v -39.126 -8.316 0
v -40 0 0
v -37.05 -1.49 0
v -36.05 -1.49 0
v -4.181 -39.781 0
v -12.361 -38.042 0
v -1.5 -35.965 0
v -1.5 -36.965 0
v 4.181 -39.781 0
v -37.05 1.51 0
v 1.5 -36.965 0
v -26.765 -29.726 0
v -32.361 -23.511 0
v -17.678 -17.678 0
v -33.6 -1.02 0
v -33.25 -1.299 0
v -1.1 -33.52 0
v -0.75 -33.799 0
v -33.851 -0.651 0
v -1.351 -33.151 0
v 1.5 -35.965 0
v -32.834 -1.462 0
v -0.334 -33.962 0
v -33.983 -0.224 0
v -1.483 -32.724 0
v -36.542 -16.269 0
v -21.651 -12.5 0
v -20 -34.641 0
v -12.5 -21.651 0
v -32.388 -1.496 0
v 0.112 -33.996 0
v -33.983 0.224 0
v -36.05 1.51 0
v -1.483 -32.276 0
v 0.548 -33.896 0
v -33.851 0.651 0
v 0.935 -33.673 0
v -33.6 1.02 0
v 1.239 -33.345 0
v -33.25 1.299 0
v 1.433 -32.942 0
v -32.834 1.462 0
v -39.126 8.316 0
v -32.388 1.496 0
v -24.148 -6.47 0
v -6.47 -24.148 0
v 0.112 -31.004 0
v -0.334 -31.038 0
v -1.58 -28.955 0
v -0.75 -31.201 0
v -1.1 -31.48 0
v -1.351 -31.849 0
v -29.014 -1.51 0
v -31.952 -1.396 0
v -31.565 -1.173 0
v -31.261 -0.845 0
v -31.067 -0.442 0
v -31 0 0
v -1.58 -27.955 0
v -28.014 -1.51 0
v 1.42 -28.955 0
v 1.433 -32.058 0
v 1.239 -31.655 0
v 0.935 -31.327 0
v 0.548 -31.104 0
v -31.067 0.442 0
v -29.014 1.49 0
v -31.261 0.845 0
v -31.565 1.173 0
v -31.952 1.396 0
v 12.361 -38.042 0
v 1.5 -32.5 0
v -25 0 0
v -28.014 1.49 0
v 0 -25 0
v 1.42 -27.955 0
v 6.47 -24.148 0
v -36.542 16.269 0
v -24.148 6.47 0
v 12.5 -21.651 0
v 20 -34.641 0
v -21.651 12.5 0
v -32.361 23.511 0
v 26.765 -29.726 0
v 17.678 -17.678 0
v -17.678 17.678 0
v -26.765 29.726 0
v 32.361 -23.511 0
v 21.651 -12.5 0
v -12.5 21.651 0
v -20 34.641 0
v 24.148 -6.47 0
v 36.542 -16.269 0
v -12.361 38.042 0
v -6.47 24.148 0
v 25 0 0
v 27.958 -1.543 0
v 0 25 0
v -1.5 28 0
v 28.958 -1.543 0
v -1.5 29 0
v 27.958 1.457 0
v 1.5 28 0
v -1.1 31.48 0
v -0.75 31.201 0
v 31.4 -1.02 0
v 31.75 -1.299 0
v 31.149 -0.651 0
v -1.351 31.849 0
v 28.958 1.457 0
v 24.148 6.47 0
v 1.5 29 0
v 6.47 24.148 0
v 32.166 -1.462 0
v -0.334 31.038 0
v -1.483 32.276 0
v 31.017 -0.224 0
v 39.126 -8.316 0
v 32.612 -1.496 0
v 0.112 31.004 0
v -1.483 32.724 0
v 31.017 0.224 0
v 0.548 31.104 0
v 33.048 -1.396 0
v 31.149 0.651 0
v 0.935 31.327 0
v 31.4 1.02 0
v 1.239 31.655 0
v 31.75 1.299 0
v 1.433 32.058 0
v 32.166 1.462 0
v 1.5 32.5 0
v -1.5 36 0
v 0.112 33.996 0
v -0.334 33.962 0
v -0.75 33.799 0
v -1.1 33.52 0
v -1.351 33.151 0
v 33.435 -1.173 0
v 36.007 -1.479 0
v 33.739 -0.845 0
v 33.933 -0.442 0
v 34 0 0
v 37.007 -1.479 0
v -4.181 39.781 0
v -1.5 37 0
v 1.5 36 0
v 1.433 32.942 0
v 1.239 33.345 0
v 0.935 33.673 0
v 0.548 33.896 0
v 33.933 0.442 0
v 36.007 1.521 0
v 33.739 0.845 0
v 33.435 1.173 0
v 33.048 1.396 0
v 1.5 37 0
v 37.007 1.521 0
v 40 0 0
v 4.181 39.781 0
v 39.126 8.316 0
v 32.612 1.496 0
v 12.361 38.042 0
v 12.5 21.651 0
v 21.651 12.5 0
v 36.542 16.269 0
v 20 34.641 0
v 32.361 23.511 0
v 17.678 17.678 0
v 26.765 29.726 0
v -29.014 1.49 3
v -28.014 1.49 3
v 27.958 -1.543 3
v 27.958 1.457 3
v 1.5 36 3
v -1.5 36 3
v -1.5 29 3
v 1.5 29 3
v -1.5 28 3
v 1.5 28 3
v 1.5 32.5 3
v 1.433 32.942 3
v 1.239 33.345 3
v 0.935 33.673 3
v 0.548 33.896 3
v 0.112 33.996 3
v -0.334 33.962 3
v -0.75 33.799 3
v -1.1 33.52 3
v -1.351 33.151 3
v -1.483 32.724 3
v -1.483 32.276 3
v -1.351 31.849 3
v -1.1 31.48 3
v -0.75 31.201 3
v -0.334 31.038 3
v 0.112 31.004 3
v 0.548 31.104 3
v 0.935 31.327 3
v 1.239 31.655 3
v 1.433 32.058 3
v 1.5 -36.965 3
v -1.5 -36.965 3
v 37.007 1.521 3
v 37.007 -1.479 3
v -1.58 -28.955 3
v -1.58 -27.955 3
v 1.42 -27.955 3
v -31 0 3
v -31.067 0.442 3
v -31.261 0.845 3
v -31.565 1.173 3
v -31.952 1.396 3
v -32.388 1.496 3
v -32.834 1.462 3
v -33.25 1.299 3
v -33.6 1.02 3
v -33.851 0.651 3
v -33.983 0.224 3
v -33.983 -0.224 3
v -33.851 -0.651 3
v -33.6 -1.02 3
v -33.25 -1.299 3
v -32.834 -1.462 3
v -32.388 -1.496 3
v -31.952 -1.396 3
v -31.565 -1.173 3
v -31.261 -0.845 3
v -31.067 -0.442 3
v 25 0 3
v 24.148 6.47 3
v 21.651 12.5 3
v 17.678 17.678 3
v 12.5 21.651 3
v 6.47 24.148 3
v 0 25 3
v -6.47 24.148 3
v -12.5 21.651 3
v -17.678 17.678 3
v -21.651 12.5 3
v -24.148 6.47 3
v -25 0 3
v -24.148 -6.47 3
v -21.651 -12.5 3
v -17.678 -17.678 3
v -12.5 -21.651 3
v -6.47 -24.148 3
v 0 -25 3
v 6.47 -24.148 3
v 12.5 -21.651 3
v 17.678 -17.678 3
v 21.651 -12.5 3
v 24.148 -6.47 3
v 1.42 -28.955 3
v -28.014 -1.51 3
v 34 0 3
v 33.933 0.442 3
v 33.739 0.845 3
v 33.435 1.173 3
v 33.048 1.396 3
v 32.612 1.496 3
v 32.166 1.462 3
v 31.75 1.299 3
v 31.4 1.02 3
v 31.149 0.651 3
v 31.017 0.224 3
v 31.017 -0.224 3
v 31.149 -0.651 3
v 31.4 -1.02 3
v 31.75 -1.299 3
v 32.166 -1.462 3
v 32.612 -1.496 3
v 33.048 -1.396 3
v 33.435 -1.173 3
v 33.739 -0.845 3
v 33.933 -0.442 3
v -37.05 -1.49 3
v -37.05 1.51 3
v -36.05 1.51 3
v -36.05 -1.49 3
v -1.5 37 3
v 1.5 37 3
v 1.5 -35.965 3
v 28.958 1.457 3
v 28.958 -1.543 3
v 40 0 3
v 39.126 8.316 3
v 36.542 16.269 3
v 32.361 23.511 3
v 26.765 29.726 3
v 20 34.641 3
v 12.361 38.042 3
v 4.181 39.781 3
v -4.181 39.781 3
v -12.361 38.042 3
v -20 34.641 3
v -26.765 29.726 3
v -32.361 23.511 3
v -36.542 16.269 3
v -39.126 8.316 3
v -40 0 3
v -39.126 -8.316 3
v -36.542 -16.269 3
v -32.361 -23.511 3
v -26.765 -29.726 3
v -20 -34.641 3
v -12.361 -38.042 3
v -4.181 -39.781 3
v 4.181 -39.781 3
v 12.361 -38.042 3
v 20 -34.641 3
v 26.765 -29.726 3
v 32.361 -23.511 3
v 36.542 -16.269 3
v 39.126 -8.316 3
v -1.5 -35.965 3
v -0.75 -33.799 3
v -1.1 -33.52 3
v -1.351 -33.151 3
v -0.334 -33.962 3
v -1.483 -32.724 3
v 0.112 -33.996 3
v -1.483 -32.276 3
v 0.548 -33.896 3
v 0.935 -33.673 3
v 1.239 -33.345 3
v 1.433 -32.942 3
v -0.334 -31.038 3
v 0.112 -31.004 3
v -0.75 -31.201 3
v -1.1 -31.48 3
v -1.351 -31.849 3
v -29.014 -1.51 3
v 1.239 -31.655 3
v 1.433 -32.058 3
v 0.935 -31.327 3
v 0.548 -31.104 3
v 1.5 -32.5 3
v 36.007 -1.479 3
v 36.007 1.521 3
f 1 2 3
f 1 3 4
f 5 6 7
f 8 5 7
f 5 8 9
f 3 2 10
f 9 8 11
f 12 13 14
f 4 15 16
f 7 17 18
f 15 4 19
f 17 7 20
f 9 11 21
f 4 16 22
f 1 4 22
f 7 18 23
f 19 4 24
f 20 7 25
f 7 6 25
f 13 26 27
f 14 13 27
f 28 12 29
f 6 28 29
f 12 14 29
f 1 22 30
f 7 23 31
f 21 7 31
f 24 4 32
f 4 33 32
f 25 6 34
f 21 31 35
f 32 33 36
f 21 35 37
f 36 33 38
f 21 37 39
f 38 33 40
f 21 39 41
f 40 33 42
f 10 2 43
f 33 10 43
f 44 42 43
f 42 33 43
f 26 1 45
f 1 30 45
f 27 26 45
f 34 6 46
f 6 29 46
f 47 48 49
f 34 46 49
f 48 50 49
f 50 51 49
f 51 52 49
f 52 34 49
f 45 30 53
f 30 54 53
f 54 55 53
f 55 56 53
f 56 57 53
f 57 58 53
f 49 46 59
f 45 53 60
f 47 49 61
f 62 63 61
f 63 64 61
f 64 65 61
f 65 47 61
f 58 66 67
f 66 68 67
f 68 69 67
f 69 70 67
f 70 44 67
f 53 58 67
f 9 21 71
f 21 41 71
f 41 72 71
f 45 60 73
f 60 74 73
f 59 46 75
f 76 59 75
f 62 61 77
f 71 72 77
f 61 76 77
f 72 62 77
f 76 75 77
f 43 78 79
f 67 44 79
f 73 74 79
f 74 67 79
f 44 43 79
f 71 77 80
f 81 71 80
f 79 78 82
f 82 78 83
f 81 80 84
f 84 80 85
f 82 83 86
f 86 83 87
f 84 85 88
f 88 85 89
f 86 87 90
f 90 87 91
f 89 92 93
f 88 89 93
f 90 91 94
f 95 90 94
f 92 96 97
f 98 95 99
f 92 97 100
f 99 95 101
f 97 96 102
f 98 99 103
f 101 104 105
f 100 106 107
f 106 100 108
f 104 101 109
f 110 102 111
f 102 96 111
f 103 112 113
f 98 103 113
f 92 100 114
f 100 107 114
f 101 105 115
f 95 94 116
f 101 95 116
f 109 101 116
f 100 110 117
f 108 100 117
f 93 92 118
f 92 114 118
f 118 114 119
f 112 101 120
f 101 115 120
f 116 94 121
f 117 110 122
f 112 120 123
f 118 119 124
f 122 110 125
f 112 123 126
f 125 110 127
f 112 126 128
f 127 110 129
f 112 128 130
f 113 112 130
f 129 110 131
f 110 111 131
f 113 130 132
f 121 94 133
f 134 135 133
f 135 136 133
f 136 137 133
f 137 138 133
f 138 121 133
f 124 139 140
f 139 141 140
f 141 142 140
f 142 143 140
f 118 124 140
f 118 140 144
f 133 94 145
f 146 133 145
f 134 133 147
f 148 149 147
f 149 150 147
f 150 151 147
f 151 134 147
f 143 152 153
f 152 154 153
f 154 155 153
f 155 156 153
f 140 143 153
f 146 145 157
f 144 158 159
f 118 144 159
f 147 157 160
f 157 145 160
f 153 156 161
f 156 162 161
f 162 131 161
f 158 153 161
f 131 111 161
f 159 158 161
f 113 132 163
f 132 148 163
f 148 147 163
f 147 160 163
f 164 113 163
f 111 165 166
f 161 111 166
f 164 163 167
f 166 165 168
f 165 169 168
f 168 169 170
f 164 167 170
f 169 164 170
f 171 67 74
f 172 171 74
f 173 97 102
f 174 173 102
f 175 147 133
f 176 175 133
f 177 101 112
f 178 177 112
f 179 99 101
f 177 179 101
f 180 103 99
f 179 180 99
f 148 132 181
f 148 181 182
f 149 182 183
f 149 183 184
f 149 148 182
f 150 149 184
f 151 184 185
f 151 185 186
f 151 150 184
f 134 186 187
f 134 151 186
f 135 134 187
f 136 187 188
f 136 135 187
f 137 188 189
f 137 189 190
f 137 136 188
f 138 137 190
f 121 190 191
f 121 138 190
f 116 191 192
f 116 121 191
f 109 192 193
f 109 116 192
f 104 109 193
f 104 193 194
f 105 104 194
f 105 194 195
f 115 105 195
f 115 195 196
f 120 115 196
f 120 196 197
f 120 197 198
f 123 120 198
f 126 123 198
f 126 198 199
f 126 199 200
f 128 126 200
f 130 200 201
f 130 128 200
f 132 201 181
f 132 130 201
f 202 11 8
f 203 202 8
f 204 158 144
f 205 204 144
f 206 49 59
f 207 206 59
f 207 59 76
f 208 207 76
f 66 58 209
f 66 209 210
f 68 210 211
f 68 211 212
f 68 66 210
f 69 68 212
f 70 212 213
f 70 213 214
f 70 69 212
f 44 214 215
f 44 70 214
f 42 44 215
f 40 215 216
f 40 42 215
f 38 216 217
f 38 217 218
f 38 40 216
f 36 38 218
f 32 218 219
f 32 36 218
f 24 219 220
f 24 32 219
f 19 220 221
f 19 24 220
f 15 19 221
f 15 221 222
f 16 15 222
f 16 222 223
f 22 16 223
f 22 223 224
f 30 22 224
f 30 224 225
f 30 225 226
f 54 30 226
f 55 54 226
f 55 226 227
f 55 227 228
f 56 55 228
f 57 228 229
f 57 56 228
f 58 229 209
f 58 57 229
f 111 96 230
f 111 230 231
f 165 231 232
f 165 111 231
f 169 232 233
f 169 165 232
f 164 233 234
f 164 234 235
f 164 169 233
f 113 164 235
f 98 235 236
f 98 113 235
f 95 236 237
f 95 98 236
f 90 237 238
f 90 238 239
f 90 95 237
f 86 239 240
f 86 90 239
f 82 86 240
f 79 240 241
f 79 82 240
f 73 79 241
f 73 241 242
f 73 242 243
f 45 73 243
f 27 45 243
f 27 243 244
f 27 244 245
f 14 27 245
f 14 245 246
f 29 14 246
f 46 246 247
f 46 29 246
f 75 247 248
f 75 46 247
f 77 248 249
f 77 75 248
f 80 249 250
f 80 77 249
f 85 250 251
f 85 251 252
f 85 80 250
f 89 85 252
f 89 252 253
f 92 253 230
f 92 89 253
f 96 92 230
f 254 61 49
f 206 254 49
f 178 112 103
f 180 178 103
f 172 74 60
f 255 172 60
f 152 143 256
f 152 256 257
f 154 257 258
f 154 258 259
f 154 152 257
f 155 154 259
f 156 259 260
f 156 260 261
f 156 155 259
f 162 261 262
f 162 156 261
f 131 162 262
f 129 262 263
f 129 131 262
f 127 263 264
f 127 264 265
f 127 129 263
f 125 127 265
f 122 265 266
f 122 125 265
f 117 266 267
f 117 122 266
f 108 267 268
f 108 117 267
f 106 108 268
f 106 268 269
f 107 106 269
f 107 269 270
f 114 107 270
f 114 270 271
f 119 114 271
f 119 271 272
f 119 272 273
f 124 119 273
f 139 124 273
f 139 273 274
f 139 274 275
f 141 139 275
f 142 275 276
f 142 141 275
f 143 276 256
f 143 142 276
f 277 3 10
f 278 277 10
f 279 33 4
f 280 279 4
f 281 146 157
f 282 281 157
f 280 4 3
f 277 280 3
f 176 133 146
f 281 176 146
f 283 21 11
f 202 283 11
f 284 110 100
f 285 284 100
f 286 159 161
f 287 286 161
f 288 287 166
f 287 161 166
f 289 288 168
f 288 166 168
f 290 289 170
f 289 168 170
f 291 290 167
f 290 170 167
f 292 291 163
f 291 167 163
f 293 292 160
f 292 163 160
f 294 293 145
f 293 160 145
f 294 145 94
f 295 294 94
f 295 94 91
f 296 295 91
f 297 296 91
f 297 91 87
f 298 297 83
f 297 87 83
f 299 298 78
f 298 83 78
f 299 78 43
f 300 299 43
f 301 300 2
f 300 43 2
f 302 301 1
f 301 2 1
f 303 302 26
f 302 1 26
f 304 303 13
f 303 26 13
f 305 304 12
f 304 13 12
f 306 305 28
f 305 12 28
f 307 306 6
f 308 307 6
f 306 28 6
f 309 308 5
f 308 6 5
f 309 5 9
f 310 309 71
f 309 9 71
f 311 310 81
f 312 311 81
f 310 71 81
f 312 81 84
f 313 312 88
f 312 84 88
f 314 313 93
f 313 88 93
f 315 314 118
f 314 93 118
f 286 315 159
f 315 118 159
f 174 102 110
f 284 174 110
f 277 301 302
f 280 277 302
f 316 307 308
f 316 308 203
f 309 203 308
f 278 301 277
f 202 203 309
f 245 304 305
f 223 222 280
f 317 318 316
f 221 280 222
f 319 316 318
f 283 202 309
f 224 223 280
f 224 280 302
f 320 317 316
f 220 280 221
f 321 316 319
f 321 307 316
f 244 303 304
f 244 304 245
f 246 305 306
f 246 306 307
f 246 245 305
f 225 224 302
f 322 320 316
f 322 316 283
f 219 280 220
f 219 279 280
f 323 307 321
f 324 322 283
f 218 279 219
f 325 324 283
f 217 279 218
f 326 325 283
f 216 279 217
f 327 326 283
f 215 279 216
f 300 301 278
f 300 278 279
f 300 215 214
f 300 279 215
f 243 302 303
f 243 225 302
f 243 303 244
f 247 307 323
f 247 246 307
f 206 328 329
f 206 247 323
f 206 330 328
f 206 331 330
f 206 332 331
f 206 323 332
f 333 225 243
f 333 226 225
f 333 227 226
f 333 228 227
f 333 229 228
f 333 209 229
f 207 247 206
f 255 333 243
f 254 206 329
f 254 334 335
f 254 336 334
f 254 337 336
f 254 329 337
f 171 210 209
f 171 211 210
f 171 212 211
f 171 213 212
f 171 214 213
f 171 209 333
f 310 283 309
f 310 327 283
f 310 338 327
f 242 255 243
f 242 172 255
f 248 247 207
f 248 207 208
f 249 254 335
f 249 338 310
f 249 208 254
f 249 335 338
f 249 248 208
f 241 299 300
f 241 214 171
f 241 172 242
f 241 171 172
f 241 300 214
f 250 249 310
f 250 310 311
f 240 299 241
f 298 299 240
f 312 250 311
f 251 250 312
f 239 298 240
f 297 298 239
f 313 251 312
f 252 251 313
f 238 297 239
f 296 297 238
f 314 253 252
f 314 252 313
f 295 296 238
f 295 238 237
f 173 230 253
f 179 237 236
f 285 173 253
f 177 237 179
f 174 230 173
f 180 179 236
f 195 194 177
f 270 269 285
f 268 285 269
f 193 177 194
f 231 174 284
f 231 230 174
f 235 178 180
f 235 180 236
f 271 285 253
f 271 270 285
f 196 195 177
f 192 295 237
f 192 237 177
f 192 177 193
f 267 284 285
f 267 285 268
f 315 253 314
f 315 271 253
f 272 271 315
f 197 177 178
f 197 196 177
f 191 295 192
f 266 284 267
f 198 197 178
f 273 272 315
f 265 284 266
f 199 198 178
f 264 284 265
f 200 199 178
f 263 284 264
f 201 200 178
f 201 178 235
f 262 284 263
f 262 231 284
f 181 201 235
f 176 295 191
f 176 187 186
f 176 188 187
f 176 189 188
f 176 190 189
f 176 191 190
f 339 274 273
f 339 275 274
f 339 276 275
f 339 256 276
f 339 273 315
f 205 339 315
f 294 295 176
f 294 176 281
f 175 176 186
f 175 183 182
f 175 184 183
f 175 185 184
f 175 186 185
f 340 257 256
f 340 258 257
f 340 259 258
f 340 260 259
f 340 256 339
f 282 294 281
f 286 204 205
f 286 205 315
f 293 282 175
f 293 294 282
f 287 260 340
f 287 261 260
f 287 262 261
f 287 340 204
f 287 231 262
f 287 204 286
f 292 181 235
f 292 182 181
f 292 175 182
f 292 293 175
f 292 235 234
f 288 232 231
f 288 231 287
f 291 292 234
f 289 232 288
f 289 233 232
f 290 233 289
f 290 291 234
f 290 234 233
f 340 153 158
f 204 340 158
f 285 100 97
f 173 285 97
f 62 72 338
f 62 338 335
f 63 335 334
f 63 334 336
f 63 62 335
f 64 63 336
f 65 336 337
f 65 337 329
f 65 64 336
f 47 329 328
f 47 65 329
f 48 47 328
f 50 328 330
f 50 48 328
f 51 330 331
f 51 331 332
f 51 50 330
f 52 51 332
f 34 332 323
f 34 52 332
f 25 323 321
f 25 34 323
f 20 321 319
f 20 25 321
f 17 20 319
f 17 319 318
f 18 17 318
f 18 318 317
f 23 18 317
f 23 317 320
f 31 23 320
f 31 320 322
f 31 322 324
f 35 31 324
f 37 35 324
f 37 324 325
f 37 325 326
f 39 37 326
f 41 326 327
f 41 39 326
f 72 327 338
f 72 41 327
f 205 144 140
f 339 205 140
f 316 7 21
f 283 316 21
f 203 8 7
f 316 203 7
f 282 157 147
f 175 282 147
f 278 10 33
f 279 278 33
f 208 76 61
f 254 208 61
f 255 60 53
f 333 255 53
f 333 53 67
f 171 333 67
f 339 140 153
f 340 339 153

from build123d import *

# Parameters (mm, degrees)
F0_R     = 40
F0_R_2   = 1.5
F0_R_3   = 25
F1_DEPTH = 3


with BuildPart() as f1:
    # F0 (on Top) → F1 (new body)
    with BuildSketch(Plane.XY):
        Circle(F0_R)
        Polygon((1.419746, -28.955333), (-0.080254, -28.955333), (-1.580254, -28.955333), (-1.580254, -27.955333), (1.419746, -27.955333), align=None, mode=Mode.SUBTRACT)
        Polygon((-29.014116, -1.51), (-29.014116, -0.01), (-29.014116, 1.49), (-28.014116, 1.49), (-28.014116, -1.51), align=None, mode=Mode.SUBTRACT)
        Polygon((-1.5, -35.965448), (0, -35.965448), (1.5, -35.965448), (1.5, -36.965448), (-1.5, -36.965448), align=None, mode=Mode.SUBTRACT)
        with Locations((0, -32.5)):
            Circle(F0_R_2, mode=Mode.SUBTRACT)
        Polygon((28.958499, 1.457314), (28.958499, -0.042686), (28.958499, -1.542686), (27.958499, -1.542686), (27.958499, 1.457314), align=None, mode=Mode.SUBTRACT)
        Polygon((-36.050154, 1.510031), (-36.050154, 0.010031), (-36.050154, -1.489969), (-37.050154, -1.489969), (-37.050154, 1.510031), align=None, mode=Mode.SUBTRACT)
        with Locations((-32.5, 0)):
            Circle(F0_R_2, mode=Mode.SUBTRACT)
        Circle(F0_R_3, mode=Mode.SUBTRACT)
        with Locations((32.5, 0)):
            Circle(F0_R_2, mode=Mode.SUBTRACT)
        Polygon((36.007276, -1.479468), (36.007276, 0.020532), (36.007276, 1.520532), (37.007276, 1.520532), (37.007276, -1.479468), align=None, mode=Mode.SUBTRACT)
        Polygon((-1.5, 29), (0, 29), (1.5, 29), (1.5, 28), (-1.5, 28), align=None, mode=Mode.SUBTRACT)
        with Locations((0, 32.5)):
            Circle(F0_R_2, mode=Mode.SUBTRACT)
        Polygon((1.5, 36), (0, 36), (-1.5, 36), (-1.5, 37), (1.5, 37), align=None, mode=Mode.SUBTRACT)
    extrude(amount=F1_DEPTH)


solid = f1.part
